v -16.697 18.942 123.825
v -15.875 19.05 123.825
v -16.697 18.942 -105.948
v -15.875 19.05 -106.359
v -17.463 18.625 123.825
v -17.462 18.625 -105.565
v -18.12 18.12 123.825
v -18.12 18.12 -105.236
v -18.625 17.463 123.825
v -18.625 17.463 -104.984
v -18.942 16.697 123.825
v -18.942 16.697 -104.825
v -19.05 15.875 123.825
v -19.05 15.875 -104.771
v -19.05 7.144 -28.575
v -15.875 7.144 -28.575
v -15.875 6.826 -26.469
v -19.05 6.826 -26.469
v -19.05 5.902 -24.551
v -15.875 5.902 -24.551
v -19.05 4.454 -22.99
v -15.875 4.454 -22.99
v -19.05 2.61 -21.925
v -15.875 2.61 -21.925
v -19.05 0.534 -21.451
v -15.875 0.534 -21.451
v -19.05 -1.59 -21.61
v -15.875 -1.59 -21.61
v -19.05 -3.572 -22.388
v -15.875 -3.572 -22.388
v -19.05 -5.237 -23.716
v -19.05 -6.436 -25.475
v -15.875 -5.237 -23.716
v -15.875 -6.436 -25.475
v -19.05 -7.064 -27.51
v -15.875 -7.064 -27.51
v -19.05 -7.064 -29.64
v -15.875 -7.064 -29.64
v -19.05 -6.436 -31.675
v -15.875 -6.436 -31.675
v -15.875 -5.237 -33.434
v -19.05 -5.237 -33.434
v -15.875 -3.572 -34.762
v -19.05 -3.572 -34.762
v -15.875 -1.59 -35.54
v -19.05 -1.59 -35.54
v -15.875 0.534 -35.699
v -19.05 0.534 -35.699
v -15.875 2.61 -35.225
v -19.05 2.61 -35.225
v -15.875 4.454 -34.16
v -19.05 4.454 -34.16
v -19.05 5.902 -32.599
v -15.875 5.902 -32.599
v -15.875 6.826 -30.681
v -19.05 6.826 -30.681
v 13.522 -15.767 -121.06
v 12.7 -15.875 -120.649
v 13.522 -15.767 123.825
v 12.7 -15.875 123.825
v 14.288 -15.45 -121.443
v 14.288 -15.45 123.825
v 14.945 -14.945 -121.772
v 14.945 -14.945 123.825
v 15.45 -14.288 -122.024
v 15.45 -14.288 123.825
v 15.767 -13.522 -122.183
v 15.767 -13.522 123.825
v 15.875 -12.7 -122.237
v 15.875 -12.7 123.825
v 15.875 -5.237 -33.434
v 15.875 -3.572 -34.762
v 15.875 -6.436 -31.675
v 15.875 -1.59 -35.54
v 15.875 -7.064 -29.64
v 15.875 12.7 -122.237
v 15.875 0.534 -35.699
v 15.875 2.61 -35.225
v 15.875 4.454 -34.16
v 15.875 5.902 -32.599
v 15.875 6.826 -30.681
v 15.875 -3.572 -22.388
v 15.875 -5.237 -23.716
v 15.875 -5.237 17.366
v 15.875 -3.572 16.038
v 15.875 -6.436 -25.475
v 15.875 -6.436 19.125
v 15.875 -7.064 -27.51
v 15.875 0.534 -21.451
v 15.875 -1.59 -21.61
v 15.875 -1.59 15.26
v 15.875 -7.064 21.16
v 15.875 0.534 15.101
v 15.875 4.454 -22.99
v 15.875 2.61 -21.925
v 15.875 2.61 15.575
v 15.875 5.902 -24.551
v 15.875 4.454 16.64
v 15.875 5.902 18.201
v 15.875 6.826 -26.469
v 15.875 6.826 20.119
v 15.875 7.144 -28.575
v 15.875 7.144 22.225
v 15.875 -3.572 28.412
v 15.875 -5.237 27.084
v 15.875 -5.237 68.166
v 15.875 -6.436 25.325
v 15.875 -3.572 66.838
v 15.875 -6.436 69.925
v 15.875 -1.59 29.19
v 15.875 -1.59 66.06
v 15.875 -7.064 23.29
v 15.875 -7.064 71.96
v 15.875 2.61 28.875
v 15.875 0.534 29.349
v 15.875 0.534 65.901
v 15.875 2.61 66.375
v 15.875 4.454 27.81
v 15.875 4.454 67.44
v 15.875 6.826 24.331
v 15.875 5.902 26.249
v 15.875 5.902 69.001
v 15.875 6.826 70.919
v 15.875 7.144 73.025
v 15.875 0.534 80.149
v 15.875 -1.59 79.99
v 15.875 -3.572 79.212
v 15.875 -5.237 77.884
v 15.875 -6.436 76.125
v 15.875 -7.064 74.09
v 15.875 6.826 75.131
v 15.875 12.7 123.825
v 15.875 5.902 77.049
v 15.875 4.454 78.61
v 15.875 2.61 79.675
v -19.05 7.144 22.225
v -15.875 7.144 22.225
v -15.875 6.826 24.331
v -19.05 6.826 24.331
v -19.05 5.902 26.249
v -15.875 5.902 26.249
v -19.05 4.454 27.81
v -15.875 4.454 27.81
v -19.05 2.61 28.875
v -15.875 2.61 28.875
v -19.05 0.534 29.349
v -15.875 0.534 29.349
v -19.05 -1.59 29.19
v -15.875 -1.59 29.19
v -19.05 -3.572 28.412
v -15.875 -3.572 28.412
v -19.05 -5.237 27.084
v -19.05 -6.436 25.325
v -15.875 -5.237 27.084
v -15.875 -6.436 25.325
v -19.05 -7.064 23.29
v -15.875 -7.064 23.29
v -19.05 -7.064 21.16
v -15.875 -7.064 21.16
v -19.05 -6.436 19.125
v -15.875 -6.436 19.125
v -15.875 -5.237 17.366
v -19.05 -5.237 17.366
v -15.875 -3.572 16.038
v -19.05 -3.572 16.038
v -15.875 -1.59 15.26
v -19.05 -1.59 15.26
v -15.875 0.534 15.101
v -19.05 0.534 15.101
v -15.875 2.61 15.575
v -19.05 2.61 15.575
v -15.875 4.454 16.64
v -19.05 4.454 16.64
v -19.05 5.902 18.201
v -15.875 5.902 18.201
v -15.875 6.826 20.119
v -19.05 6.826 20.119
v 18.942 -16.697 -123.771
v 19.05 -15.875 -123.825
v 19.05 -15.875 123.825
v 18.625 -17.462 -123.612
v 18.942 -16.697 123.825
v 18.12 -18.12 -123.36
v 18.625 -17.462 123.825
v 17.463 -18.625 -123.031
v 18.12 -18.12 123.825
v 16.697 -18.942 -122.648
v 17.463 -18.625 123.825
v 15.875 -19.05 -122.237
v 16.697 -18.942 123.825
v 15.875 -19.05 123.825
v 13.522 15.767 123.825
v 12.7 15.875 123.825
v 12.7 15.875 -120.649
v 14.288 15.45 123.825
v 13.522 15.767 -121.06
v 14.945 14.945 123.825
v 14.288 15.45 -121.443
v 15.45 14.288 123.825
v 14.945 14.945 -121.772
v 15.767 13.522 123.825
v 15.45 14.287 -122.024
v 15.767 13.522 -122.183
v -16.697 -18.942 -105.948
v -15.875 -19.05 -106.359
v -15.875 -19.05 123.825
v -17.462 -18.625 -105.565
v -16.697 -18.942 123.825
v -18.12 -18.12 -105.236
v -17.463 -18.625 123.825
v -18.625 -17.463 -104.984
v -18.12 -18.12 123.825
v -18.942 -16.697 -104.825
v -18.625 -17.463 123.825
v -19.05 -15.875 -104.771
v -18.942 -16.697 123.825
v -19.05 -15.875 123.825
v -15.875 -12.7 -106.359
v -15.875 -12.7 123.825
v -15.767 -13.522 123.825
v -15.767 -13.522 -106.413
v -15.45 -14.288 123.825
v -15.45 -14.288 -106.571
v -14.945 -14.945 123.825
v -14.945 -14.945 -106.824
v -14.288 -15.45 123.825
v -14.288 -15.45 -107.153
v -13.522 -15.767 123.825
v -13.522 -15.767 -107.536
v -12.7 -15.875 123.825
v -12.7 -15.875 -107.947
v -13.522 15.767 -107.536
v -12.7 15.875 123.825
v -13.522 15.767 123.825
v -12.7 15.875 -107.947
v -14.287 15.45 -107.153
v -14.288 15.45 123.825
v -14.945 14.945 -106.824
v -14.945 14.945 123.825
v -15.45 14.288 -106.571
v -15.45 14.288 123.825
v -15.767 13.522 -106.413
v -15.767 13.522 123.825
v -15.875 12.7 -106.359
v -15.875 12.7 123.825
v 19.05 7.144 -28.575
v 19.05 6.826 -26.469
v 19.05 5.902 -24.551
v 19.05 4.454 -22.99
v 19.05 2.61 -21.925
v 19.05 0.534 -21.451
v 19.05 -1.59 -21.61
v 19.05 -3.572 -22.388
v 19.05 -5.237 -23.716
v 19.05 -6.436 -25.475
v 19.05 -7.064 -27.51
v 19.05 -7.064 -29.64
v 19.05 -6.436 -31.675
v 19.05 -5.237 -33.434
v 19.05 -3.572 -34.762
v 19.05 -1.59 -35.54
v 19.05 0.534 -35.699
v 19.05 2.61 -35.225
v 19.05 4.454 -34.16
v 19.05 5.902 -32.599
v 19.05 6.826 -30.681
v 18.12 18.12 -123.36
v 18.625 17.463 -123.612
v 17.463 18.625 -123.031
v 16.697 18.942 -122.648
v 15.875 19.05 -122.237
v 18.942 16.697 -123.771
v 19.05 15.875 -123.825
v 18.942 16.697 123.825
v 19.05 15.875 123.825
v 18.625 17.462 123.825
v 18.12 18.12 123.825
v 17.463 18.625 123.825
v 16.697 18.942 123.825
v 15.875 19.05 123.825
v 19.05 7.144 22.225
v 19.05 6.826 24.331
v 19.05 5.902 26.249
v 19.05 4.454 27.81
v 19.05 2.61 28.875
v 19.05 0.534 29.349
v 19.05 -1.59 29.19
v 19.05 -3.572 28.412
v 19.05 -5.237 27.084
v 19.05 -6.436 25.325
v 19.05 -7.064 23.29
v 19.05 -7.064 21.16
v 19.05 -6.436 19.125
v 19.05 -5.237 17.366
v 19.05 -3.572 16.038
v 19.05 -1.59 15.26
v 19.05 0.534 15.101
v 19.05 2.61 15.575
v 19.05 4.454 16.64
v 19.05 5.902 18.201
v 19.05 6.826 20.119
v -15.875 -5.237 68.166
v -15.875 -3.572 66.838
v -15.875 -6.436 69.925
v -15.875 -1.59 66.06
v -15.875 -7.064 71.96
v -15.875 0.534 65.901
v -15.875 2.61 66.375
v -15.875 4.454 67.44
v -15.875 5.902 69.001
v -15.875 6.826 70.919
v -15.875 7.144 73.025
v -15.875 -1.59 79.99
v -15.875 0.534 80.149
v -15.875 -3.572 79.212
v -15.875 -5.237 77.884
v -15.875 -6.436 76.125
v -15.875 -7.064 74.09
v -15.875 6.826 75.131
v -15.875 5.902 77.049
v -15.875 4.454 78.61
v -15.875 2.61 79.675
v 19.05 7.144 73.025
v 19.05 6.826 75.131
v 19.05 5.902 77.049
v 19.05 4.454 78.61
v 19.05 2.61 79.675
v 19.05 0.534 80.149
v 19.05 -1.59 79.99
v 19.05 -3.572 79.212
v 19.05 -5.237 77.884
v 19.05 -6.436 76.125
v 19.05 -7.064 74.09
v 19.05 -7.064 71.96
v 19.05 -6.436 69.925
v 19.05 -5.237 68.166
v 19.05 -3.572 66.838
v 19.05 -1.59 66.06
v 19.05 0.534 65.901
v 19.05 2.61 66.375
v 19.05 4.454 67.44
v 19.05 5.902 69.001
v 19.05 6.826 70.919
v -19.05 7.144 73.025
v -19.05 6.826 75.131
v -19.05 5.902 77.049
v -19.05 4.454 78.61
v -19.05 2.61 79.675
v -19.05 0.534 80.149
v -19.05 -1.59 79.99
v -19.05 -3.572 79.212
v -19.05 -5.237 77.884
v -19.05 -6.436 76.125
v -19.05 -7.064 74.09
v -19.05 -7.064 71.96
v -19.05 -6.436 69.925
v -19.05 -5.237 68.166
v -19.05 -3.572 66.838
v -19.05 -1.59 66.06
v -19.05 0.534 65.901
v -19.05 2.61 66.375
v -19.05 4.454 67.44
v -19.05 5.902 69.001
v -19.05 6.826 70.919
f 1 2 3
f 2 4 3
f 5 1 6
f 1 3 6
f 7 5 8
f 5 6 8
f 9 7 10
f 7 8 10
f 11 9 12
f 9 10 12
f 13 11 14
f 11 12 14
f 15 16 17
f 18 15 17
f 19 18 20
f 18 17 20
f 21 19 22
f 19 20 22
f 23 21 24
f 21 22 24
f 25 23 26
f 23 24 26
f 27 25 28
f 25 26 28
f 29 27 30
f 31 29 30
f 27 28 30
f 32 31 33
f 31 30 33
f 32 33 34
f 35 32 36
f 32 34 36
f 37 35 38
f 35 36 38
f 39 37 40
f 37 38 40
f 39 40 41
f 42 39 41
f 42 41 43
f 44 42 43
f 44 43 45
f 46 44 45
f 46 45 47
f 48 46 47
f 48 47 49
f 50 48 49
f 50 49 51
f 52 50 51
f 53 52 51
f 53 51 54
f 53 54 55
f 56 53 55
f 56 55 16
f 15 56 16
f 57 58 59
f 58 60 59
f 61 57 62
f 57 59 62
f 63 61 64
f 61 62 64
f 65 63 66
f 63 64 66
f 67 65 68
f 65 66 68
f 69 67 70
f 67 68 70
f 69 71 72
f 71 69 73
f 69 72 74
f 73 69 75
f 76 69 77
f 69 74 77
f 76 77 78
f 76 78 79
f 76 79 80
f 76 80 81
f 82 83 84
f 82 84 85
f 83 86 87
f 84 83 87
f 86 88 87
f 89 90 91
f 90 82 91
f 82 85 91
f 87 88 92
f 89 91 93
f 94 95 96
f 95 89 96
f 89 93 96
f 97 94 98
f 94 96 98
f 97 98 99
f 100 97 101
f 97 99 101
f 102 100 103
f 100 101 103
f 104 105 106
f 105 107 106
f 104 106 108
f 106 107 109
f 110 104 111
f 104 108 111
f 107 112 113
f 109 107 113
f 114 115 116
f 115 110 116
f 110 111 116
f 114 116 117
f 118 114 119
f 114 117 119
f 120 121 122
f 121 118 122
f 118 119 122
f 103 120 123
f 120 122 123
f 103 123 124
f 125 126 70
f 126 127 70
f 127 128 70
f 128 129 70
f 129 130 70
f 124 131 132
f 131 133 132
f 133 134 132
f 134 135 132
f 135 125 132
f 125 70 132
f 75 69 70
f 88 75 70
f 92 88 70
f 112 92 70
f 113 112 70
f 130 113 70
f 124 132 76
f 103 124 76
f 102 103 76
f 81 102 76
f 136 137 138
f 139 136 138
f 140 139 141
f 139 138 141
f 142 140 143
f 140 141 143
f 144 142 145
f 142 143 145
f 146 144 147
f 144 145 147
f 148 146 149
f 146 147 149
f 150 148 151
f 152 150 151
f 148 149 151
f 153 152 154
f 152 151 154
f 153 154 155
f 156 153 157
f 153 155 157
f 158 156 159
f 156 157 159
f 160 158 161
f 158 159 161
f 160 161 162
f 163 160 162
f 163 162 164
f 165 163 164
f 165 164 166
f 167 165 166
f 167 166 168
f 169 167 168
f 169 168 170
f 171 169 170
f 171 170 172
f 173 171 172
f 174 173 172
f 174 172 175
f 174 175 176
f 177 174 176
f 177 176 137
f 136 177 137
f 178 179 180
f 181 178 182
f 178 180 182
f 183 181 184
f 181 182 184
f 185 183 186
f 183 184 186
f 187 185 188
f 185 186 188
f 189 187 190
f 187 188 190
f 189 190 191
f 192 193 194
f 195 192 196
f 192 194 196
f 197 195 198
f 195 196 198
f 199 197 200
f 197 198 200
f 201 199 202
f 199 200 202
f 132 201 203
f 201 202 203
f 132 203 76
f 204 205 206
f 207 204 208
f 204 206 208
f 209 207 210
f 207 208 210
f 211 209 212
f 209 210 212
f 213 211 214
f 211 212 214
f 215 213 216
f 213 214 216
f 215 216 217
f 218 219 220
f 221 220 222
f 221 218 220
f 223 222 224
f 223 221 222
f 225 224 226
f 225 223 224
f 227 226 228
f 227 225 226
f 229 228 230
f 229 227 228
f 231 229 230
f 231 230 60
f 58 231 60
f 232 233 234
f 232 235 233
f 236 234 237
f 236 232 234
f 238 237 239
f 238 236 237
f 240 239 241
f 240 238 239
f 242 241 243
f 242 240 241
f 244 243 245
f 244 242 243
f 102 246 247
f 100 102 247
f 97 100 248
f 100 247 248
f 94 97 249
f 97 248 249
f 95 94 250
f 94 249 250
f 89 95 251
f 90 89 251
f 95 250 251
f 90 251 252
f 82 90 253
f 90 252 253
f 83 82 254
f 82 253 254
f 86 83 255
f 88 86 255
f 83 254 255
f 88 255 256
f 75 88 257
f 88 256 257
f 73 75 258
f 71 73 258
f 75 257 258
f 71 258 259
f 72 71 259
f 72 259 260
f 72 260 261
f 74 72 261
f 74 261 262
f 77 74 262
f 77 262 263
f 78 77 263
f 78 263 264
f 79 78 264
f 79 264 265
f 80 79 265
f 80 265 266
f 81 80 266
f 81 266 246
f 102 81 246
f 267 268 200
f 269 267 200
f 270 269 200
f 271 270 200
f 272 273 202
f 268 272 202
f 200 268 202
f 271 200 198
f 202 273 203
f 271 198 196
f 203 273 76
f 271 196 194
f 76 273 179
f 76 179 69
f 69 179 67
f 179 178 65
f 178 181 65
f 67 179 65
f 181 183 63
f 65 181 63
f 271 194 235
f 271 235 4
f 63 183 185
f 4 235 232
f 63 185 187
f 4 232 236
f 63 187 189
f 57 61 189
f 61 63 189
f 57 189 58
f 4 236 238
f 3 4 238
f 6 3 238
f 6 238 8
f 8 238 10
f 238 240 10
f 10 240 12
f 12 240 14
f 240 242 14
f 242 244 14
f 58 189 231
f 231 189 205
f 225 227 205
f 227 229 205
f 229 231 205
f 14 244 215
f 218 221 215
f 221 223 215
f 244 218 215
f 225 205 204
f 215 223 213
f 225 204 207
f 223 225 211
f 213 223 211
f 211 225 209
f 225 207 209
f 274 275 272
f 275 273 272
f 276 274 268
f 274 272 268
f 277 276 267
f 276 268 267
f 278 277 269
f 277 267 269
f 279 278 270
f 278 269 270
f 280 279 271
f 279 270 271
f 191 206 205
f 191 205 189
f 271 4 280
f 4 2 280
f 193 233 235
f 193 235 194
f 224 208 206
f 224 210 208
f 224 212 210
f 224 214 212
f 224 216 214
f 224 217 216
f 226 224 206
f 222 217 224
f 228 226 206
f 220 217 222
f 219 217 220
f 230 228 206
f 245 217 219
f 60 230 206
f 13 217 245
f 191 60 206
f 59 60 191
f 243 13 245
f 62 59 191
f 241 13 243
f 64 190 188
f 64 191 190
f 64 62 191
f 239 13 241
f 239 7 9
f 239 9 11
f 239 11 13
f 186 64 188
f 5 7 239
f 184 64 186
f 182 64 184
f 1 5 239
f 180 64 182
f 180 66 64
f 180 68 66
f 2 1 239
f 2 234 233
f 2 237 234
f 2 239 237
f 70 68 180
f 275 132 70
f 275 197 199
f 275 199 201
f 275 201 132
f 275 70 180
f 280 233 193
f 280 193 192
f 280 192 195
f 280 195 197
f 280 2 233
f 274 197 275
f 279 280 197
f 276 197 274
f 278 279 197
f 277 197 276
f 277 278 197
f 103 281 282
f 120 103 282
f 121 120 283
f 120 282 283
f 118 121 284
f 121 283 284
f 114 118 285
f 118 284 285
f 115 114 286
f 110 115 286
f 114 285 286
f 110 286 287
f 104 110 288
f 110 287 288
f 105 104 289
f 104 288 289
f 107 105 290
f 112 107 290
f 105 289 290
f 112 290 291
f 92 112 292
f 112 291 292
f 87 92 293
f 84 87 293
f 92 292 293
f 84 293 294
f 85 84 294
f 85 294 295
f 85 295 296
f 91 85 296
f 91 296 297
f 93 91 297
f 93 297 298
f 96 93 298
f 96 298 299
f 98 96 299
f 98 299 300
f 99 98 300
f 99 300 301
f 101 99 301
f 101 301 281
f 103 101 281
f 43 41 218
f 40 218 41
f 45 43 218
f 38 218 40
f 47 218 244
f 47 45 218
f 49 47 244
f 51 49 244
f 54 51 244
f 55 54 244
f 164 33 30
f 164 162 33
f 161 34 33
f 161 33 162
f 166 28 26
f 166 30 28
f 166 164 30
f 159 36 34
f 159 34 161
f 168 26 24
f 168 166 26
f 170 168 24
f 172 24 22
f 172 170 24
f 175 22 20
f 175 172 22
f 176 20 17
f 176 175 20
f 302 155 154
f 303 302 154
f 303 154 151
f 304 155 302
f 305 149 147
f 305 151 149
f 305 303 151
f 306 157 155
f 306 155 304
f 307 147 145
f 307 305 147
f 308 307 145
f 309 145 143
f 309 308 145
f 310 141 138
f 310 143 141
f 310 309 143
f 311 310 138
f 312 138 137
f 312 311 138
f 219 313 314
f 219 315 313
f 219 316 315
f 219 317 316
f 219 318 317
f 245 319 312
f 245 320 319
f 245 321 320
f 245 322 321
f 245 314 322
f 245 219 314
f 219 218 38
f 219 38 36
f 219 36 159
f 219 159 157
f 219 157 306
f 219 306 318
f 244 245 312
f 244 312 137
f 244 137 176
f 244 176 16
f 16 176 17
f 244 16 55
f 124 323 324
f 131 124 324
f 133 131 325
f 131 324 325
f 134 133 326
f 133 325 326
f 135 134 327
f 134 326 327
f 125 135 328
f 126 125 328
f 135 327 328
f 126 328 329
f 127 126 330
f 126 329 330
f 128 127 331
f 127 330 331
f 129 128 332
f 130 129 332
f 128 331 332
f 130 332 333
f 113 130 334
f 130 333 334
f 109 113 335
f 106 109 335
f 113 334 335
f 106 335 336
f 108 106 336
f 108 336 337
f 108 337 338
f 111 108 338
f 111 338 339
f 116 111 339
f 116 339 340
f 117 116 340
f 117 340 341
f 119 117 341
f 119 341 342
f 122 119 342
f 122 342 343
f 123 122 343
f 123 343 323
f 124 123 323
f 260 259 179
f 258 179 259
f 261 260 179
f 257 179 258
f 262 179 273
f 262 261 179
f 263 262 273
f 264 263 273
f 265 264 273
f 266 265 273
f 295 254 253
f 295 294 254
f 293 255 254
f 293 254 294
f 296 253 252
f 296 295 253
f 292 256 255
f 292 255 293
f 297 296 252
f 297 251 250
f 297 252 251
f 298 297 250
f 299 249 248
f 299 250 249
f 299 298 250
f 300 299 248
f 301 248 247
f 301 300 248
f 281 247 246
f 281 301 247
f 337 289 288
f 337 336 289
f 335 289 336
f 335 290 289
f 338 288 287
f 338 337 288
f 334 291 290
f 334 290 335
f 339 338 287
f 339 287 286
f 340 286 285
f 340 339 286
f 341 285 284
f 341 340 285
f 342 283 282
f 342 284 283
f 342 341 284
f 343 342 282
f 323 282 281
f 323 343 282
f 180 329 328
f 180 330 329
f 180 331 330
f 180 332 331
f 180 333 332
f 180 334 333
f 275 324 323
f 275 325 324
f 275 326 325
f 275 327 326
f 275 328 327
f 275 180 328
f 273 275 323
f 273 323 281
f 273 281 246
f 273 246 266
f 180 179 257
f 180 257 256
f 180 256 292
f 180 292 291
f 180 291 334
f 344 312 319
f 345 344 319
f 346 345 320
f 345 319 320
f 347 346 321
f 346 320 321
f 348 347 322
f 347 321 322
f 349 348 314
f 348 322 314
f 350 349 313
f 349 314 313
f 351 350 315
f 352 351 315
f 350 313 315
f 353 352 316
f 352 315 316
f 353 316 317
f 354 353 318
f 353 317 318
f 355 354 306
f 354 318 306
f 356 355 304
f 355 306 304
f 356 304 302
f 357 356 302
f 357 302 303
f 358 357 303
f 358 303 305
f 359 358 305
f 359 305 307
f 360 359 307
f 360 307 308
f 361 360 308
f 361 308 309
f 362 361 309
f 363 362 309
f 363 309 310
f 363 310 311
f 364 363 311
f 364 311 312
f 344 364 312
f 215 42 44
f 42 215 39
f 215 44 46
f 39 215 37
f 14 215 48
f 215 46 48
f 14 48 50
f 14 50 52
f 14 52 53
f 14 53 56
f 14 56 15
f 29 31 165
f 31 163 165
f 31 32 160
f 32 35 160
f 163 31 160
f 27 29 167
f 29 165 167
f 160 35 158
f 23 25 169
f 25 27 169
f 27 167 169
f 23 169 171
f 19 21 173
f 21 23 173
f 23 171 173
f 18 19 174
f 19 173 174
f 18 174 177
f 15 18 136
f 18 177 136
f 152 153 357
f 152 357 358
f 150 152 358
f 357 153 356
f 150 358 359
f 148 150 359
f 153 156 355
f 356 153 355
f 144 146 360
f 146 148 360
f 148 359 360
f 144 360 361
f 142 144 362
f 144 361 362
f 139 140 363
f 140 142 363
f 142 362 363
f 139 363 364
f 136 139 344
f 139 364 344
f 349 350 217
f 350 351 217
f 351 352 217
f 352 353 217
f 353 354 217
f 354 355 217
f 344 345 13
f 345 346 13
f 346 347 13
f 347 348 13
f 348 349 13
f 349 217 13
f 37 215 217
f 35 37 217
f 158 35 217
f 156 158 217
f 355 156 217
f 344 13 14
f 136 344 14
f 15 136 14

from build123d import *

# Parameters (mm, degrees)
F0_W     = 38.1
F0_H     = 38.1
F1_DEPTH = 123.825
F2_T     = -3.175
F3_R     = 7.14375
F4_DEPTH = 38.101
F6_DEPTH = 38.101
F7_R     = 3.175


with BuildPart() as f1:
    # F0 (on Top) → F1 (new body, symmetric)
    with BuildSketch(Plane.XY):
        Rectangle(F0_W, F0_H)
    extrude(amount=F1_DEPTH, both=True)

    # F2
    f2_openings = [f1.faces().sort_by_distance(p)[0] for p in [
        (0, 0, 123.825),
        (0, 0, -123.825),
    ]]
    offset(amount=F2_T, openings=f2_openings)

    # F3 (on face) → F4 (cut, through all)
    with BuildSketch(Plane.YZ.offset(19.05)):
        with Locations((0, 73.025)):
            Circle(F3_R)
        with Locations((0, 22.225)):
            Circle(F3_R)
        with Locations((0, -28.575)):
            Circle(F3_R)
    extrude(amount=-F4_DEPTH, mode=Mode.SUBTRACT)

    # F5 (on face) → F6 (cut, through all)
    with BuildSketch(Plane.XZ.offset(19.05)):
        Polygon((-19.05, -123.825), (19.05, -123.825), (-19.05, -104.7708862961), align=None)
    extrude(amount=-F6_DEPTH, mode=Mode.SUBTRACT)

    # F7
    f7_edges = [f1.edges().sort_by_distance(p)[0] for p in [
        (-19.05, -19.05, 9.527057),
        (19.05, 19.05, 0),
        (19.05, -19.05, 0),
        (-19.05, 19.05, 9.527057),
        (-15.875, -15.875, 8.733135),
        (-15.875, 15.875, 8.733135),
        (15.875, 15.875, 0.793921),
        (15.875, -15.875, 0.793921),
    ]]
    fillet(f7_edges, radius=F7_R)


solid = f1.part
